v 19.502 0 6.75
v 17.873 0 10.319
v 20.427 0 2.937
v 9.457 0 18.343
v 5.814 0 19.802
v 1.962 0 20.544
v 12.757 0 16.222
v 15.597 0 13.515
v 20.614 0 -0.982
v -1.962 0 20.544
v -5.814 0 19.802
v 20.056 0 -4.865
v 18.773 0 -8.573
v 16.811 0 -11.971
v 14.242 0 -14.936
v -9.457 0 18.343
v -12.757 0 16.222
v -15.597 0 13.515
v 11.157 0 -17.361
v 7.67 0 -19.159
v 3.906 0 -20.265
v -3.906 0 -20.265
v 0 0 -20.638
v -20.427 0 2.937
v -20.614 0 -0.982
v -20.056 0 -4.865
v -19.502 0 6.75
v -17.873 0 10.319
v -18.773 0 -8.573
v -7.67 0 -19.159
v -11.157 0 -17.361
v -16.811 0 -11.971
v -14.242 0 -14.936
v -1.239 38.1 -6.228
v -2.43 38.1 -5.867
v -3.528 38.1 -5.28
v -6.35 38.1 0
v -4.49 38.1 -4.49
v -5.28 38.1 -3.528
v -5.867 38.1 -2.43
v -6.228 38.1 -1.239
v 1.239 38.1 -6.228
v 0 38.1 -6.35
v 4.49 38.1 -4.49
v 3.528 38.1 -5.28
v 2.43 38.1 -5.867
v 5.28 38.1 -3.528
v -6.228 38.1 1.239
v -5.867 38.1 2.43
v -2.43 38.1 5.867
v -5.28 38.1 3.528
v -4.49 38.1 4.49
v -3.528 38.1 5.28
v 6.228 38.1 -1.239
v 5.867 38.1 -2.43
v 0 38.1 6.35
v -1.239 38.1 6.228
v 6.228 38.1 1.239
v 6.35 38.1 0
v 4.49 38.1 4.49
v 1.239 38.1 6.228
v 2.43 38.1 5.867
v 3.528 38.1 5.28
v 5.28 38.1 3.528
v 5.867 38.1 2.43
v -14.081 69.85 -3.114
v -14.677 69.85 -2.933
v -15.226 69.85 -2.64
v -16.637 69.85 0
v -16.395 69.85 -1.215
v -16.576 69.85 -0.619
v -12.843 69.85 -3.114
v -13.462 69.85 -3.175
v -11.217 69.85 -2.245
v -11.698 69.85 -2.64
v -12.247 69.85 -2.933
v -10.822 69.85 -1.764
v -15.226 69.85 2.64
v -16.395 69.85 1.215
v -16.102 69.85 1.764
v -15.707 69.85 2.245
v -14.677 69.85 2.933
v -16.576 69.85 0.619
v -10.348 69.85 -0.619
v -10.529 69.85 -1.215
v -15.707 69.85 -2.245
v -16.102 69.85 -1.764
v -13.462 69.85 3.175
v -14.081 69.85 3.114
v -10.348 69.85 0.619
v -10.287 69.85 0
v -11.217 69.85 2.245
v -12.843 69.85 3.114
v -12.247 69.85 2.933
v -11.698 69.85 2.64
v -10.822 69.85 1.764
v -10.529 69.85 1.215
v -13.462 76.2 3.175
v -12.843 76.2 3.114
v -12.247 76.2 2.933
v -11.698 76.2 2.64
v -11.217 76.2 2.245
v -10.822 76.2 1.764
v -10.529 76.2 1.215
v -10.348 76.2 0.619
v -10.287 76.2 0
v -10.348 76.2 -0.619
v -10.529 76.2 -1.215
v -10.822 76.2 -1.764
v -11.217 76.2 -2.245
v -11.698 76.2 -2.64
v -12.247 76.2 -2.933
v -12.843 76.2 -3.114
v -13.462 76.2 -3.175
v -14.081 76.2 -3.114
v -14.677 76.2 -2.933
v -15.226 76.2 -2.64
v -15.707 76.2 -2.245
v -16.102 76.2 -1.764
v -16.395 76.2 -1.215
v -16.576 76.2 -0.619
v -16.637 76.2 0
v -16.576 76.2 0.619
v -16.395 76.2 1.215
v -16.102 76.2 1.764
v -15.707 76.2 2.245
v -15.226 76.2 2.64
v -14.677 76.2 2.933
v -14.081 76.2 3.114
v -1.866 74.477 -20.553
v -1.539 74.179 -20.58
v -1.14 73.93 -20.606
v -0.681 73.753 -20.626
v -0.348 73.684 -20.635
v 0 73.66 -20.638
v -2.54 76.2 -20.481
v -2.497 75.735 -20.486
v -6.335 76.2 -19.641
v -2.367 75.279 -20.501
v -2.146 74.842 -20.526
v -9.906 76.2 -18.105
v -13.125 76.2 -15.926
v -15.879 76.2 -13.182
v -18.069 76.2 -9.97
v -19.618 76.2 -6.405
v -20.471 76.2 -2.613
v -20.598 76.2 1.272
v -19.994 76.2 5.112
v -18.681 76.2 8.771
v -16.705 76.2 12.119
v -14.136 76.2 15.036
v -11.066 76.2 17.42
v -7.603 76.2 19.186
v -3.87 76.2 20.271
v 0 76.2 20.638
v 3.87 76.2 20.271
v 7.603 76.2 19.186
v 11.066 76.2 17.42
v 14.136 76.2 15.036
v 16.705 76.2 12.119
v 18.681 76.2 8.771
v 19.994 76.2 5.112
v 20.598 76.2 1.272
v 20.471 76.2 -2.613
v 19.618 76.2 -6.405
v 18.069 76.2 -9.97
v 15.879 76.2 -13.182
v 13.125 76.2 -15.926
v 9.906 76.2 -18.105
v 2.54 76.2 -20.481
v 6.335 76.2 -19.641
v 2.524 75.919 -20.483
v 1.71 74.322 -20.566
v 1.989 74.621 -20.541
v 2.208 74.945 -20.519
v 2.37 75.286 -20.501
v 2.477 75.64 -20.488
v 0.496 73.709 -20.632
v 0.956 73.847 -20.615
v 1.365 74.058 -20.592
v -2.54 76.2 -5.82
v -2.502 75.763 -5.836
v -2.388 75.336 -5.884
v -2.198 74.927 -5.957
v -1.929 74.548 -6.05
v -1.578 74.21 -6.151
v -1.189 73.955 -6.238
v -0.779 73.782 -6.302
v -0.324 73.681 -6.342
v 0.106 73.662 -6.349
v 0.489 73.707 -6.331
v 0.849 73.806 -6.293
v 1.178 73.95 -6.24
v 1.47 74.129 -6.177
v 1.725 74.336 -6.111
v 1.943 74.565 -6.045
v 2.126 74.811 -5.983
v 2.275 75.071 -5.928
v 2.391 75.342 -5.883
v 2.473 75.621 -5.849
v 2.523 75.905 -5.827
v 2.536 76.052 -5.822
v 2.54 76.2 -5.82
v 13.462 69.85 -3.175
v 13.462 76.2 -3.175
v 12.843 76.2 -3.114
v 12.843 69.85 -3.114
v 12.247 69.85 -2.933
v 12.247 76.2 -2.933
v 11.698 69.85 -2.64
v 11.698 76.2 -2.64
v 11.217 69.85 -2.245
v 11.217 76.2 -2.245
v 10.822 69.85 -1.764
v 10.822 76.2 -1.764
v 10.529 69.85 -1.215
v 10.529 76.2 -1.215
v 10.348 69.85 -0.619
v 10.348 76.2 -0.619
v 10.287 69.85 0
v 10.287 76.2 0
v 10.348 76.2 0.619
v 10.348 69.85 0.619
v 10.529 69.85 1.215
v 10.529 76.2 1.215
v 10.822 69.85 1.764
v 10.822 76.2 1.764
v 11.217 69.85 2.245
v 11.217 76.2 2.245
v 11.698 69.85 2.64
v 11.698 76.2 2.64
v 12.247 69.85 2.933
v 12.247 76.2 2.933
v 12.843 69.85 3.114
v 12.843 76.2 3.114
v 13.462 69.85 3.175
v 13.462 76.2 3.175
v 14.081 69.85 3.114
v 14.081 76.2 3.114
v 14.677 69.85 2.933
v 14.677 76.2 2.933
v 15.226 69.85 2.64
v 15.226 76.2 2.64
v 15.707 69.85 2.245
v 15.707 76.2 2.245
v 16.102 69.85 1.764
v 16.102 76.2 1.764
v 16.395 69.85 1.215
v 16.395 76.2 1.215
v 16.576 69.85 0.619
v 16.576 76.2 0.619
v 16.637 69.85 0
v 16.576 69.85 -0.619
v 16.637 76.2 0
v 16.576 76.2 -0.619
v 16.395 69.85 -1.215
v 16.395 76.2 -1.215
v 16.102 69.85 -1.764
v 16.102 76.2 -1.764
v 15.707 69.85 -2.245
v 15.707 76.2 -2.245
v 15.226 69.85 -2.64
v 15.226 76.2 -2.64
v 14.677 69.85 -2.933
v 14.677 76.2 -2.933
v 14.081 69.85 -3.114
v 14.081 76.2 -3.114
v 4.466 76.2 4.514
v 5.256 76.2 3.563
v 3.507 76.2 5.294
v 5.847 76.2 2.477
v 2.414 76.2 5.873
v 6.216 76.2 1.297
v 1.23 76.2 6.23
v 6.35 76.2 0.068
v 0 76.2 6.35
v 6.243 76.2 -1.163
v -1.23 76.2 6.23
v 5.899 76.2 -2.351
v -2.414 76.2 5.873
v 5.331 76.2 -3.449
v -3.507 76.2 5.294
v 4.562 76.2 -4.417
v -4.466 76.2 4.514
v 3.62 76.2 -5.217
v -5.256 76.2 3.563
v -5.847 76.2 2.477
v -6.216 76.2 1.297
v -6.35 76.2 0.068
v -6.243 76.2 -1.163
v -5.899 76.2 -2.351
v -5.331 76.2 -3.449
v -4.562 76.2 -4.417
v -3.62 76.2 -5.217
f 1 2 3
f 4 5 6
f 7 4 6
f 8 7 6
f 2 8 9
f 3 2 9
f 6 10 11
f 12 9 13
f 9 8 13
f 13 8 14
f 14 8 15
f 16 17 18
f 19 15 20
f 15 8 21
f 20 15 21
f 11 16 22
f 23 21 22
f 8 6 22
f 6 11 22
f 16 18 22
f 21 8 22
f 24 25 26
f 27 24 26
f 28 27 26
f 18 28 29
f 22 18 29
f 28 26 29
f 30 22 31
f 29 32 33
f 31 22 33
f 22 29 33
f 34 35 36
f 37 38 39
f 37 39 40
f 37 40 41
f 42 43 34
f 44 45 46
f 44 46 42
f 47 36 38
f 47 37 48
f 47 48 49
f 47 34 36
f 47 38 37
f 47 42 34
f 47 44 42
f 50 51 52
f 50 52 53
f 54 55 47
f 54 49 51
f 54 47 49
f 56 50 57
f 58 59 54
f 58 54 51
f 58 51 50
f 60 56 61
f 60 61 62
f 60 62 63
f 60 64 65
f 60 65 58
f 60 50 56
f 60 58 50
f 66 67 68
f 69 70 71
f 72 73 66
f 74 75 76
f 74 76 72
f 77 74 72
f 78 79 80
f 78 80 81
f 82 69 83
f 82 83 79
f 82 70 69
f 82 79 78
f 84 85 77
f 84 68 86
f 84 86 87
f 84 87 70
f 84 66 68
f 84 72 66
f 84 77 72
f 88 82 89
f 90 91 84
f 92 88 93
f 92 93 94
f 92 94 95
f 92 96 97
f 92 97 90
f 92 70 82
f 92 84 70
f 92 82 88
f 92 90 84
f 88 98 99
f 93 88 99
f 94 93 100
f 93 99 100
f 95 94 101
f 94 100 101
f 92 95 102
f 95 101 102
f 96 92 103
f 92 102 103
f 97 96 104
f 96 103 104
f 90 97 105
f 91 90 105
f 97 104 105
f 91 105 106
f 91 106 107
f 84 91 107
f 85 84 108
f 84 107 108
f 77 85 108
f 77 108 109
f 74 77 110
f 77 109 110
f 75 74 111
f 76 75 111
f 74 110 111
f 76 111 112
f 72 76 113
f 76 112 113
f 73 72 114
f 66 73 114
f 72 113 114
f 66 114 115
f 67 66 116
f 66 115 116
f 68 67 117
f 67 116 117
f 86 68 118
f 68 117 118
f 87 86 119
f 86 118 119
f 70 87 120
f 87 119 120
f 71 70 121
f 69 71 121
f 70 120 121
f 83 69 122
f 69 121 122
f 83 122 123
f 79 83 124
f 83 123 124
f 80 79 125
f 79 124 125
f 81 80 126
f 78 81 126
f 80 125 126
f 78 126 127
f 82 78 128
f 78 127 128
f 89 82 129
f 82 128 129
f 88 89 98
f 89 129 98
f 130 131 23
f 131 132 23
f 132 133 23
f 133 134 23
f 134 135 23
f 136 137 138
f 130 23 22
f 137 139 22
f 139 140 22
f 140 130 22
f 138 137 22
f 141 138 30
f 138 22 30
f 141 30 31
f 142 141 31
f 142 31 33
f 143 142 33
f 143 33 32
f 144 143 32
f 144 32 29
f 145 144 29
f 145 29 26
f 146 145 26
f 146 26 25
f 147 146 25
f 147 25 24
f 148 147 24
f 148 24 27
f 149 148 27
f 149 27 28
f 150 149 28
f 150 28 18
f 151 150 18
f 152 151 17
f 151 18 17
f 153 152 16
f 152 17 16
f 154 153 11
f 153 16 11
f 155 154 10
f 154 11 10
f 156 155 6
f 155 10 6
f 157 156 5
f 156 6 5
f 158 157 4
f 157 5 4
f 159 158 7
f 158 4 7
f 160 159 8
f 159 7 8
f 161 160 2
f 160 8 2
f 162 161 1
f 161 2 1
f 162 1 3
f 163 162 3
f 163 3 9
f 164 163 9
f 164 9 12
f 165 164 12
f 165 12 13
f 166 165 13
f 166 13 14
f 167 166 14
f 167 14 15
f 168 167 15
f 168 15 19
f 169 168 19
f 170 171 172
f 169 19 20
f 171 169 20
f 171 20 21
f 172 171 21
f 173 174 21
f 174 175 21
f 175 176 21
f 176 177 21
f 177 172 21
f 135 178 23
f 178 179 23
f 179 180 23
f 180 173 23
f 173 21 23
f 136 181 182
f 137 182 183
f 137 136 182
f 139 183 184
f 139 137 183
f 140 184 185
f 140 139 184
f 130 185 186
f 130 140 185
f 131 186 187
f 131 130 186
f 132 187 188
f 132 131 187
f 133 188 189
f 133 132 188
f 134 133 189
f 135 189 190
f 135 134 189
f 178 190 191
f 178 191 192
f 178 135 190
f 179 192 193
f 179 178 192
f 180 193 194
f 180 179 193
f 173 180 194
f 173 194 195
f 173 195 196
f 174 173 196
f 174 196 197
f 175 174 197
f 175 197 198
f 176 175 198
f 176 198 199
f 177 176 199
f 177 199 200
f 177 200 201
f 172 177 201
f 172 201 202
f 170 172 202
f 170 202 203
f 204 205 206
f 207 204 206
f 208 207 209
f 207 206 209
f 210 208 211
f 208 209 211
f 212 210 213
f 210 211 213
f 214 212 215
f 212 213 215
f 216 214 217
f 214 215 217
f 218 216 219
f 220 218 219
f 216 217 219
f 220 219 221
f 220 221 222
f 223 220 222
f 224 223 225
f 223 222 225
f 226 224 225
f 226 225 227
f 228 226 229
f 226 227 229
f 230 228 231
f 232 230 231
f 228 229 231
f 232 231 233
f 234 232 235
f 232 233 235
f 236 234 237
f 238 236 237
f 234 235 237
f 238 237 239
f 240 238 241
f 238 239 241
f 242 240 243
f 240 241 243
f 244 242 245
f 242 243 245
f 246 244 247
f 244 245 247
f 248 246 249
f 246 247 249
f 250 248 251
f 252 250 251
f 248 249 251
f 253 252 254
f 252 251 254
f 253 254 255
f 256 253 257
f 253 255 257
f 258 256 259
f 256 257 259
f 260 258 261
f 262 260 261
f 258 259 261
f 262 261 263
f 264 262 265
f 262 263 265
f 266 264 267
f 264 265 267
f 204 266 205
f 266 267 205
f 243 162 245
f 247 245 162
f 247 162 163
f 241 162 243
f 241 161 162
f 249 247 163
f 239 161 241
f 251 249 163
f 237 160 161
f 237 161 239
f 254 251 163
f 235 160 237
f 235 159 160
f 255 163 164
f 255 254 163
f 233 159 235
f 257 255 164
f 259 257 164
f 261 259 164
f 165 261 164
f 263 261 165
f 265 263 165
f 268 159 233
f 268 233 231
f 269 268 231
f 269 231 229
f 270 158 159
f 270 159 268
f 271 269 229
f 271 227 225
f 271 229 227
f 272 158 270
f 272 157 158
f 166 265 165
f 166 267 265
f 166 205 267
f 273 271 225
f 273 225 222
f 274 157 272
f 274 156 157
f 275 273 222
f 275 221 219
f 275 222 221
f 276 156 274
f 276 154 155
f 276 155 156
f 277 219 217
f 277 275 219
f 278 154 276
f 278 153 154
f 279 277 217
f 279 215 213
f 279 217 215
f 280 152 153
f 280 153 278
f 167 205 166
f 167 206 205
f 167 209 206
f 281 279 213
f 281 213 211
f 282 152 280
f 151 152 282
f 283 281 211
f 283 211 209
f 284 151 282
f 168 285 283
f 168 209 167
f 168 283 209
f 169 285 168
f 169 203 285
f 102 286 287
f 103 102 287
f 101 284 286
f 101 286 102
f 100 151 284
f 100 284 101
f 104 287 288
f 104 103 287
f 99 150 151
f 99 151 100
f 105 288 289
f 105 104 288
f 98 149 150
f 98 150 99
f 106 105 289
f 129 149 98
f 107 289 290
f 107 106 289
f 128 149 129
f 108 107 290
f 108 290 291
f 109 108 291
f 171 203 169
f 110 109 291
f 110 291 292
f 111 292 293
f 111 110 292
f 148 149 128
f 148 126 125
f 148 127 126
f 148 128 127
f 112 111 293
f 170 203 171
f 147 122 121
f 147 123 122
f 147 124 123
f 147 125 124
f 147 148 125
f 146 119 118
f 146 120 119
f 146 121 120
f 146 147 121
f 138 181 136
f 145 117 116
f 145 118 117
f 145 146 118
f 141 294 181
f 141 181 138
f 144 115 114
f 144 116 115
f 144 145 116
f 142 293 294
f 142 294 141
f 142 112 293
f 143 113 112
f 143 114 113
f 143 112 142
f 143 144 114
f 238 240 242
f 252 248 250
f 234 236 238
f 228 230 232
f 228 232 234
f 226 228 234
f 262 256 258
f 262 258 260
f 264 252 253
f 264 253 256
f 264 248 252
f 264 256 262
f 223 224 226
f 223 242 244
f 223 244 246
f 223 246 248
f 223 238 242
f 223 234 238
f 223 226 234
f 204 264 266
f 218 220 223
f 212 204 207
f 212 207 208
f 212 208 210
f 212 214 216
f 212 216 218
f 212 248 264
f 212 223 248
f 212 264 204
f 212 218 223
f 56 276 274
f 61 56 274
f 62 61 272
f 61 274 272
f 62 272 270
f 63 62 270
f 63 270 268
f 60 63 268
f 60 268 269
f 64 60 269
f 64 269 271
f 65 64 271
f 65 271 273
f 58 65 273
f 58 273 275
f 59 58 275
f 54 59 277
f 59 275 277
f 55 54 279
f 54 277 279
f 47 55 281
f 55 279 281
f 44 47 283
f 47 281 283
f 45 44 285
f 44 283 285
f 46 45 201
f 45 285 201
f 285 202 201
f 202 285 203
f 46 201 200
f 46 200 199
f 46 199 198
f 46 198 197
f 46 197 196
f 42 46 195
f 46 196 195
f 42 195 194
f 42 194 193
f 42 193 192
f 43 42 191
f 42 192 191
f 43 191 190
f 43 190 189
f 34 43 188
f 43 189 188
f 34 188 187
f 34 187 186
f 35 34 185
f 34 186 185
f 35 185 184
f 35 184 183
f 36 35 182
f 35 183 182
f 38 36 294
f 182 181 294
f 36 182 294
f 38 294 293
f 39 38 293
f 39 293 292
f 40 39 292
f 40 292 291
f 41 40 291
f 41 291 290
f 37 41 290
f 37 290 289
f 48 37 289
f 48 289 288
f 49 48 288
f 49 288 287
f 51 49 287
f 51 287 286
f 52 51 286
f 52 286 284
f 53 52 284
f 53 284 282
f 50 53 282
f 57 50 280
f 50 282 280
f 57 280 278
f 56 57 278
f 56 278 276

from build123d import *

# Parameters (mm, degrees)
SKETCH1_R               = 20.6375
BOSS_EXTRUDE1_DEPTH     = 76.2
SKETCH2_R               = 6.35
CUT_EXTRUDE1_DEPTH      = 38.1
CUT_REVOLVE_THIN1_START = -20.6375
CUT_REVOLVE_THIN1_DEPTH = 14.817629087
SKETCH4_R               = 3.175
CUT_EXTRUDE2_DEPTH      = 6.35


# Read off the part's stored shape, not the designer's step: Cut-Revolve-Thin1
with BuildPart() as part:
    # Sketch1 → Boss-Extrude1 (new body)
    with BuildSketch(Plane(origin=(0, 0, 0), x_dir=(1, 0, 0), z_dir=(0, 1, 0))):
        with Locations(Location((0, 0, 0), (0, 0, 90))):
            Circle(SKETCH1_R)
    extrude(amount=BOSS_EXTRUDE1_DEPTH)

    # Sketch2 → Cut-Extrude1 (cut)
    with BuildSketch(Plane(origin=(0, 76.2, 0), x_dir=(-1, 0, 0), z_dir=(0, 1, 0))):
        with Locations(Location((0, 0, 0), (0, 0, 90))):
            Circle(SKETCH2_R)
    extrude(amount=-CUT_EXTRUDE1_DEPTH, mode=Mode.SUBTRACT)

    # Cut-Revolve-Thin1 outline → Cut-Revolve-Thin1 (cut)
    with BuildSketch(Plane.XY.offset(CUT_REVOLVE_THIN1_START)):
        with BuildLine():
            Line((2.54, 76.2), (-2.54, 76.2))
            ThreePointArc((-2.54, 76.2), (0, 73.66), (2.54, 76.2))
        make_face()
    extrude(amount=CUT_REVOLVE_THIN1_DEPTH, mode=Mode.SUBTRACT)

    # Sketch4 → Cut-Extrude2 (cut)
    with BuildSketch(Plane(origin=(0, 76.2, 0), x_dir=(1, 0, 0), z_dir=(0, 1, 0))):
        with Locations(Location((-13.462, 0, 0), (0, 0, 270))):
            Circle(SKETCH4_R)
        with Locations(Location((13.462, 0, 0), (0, 0, 90))):
            Circle(SKETCH4_R)
    extrude(amount=-CUT_EXTRUDE2_DEPTH, mode=Mode.SUBTRACT)


solid = part.part
